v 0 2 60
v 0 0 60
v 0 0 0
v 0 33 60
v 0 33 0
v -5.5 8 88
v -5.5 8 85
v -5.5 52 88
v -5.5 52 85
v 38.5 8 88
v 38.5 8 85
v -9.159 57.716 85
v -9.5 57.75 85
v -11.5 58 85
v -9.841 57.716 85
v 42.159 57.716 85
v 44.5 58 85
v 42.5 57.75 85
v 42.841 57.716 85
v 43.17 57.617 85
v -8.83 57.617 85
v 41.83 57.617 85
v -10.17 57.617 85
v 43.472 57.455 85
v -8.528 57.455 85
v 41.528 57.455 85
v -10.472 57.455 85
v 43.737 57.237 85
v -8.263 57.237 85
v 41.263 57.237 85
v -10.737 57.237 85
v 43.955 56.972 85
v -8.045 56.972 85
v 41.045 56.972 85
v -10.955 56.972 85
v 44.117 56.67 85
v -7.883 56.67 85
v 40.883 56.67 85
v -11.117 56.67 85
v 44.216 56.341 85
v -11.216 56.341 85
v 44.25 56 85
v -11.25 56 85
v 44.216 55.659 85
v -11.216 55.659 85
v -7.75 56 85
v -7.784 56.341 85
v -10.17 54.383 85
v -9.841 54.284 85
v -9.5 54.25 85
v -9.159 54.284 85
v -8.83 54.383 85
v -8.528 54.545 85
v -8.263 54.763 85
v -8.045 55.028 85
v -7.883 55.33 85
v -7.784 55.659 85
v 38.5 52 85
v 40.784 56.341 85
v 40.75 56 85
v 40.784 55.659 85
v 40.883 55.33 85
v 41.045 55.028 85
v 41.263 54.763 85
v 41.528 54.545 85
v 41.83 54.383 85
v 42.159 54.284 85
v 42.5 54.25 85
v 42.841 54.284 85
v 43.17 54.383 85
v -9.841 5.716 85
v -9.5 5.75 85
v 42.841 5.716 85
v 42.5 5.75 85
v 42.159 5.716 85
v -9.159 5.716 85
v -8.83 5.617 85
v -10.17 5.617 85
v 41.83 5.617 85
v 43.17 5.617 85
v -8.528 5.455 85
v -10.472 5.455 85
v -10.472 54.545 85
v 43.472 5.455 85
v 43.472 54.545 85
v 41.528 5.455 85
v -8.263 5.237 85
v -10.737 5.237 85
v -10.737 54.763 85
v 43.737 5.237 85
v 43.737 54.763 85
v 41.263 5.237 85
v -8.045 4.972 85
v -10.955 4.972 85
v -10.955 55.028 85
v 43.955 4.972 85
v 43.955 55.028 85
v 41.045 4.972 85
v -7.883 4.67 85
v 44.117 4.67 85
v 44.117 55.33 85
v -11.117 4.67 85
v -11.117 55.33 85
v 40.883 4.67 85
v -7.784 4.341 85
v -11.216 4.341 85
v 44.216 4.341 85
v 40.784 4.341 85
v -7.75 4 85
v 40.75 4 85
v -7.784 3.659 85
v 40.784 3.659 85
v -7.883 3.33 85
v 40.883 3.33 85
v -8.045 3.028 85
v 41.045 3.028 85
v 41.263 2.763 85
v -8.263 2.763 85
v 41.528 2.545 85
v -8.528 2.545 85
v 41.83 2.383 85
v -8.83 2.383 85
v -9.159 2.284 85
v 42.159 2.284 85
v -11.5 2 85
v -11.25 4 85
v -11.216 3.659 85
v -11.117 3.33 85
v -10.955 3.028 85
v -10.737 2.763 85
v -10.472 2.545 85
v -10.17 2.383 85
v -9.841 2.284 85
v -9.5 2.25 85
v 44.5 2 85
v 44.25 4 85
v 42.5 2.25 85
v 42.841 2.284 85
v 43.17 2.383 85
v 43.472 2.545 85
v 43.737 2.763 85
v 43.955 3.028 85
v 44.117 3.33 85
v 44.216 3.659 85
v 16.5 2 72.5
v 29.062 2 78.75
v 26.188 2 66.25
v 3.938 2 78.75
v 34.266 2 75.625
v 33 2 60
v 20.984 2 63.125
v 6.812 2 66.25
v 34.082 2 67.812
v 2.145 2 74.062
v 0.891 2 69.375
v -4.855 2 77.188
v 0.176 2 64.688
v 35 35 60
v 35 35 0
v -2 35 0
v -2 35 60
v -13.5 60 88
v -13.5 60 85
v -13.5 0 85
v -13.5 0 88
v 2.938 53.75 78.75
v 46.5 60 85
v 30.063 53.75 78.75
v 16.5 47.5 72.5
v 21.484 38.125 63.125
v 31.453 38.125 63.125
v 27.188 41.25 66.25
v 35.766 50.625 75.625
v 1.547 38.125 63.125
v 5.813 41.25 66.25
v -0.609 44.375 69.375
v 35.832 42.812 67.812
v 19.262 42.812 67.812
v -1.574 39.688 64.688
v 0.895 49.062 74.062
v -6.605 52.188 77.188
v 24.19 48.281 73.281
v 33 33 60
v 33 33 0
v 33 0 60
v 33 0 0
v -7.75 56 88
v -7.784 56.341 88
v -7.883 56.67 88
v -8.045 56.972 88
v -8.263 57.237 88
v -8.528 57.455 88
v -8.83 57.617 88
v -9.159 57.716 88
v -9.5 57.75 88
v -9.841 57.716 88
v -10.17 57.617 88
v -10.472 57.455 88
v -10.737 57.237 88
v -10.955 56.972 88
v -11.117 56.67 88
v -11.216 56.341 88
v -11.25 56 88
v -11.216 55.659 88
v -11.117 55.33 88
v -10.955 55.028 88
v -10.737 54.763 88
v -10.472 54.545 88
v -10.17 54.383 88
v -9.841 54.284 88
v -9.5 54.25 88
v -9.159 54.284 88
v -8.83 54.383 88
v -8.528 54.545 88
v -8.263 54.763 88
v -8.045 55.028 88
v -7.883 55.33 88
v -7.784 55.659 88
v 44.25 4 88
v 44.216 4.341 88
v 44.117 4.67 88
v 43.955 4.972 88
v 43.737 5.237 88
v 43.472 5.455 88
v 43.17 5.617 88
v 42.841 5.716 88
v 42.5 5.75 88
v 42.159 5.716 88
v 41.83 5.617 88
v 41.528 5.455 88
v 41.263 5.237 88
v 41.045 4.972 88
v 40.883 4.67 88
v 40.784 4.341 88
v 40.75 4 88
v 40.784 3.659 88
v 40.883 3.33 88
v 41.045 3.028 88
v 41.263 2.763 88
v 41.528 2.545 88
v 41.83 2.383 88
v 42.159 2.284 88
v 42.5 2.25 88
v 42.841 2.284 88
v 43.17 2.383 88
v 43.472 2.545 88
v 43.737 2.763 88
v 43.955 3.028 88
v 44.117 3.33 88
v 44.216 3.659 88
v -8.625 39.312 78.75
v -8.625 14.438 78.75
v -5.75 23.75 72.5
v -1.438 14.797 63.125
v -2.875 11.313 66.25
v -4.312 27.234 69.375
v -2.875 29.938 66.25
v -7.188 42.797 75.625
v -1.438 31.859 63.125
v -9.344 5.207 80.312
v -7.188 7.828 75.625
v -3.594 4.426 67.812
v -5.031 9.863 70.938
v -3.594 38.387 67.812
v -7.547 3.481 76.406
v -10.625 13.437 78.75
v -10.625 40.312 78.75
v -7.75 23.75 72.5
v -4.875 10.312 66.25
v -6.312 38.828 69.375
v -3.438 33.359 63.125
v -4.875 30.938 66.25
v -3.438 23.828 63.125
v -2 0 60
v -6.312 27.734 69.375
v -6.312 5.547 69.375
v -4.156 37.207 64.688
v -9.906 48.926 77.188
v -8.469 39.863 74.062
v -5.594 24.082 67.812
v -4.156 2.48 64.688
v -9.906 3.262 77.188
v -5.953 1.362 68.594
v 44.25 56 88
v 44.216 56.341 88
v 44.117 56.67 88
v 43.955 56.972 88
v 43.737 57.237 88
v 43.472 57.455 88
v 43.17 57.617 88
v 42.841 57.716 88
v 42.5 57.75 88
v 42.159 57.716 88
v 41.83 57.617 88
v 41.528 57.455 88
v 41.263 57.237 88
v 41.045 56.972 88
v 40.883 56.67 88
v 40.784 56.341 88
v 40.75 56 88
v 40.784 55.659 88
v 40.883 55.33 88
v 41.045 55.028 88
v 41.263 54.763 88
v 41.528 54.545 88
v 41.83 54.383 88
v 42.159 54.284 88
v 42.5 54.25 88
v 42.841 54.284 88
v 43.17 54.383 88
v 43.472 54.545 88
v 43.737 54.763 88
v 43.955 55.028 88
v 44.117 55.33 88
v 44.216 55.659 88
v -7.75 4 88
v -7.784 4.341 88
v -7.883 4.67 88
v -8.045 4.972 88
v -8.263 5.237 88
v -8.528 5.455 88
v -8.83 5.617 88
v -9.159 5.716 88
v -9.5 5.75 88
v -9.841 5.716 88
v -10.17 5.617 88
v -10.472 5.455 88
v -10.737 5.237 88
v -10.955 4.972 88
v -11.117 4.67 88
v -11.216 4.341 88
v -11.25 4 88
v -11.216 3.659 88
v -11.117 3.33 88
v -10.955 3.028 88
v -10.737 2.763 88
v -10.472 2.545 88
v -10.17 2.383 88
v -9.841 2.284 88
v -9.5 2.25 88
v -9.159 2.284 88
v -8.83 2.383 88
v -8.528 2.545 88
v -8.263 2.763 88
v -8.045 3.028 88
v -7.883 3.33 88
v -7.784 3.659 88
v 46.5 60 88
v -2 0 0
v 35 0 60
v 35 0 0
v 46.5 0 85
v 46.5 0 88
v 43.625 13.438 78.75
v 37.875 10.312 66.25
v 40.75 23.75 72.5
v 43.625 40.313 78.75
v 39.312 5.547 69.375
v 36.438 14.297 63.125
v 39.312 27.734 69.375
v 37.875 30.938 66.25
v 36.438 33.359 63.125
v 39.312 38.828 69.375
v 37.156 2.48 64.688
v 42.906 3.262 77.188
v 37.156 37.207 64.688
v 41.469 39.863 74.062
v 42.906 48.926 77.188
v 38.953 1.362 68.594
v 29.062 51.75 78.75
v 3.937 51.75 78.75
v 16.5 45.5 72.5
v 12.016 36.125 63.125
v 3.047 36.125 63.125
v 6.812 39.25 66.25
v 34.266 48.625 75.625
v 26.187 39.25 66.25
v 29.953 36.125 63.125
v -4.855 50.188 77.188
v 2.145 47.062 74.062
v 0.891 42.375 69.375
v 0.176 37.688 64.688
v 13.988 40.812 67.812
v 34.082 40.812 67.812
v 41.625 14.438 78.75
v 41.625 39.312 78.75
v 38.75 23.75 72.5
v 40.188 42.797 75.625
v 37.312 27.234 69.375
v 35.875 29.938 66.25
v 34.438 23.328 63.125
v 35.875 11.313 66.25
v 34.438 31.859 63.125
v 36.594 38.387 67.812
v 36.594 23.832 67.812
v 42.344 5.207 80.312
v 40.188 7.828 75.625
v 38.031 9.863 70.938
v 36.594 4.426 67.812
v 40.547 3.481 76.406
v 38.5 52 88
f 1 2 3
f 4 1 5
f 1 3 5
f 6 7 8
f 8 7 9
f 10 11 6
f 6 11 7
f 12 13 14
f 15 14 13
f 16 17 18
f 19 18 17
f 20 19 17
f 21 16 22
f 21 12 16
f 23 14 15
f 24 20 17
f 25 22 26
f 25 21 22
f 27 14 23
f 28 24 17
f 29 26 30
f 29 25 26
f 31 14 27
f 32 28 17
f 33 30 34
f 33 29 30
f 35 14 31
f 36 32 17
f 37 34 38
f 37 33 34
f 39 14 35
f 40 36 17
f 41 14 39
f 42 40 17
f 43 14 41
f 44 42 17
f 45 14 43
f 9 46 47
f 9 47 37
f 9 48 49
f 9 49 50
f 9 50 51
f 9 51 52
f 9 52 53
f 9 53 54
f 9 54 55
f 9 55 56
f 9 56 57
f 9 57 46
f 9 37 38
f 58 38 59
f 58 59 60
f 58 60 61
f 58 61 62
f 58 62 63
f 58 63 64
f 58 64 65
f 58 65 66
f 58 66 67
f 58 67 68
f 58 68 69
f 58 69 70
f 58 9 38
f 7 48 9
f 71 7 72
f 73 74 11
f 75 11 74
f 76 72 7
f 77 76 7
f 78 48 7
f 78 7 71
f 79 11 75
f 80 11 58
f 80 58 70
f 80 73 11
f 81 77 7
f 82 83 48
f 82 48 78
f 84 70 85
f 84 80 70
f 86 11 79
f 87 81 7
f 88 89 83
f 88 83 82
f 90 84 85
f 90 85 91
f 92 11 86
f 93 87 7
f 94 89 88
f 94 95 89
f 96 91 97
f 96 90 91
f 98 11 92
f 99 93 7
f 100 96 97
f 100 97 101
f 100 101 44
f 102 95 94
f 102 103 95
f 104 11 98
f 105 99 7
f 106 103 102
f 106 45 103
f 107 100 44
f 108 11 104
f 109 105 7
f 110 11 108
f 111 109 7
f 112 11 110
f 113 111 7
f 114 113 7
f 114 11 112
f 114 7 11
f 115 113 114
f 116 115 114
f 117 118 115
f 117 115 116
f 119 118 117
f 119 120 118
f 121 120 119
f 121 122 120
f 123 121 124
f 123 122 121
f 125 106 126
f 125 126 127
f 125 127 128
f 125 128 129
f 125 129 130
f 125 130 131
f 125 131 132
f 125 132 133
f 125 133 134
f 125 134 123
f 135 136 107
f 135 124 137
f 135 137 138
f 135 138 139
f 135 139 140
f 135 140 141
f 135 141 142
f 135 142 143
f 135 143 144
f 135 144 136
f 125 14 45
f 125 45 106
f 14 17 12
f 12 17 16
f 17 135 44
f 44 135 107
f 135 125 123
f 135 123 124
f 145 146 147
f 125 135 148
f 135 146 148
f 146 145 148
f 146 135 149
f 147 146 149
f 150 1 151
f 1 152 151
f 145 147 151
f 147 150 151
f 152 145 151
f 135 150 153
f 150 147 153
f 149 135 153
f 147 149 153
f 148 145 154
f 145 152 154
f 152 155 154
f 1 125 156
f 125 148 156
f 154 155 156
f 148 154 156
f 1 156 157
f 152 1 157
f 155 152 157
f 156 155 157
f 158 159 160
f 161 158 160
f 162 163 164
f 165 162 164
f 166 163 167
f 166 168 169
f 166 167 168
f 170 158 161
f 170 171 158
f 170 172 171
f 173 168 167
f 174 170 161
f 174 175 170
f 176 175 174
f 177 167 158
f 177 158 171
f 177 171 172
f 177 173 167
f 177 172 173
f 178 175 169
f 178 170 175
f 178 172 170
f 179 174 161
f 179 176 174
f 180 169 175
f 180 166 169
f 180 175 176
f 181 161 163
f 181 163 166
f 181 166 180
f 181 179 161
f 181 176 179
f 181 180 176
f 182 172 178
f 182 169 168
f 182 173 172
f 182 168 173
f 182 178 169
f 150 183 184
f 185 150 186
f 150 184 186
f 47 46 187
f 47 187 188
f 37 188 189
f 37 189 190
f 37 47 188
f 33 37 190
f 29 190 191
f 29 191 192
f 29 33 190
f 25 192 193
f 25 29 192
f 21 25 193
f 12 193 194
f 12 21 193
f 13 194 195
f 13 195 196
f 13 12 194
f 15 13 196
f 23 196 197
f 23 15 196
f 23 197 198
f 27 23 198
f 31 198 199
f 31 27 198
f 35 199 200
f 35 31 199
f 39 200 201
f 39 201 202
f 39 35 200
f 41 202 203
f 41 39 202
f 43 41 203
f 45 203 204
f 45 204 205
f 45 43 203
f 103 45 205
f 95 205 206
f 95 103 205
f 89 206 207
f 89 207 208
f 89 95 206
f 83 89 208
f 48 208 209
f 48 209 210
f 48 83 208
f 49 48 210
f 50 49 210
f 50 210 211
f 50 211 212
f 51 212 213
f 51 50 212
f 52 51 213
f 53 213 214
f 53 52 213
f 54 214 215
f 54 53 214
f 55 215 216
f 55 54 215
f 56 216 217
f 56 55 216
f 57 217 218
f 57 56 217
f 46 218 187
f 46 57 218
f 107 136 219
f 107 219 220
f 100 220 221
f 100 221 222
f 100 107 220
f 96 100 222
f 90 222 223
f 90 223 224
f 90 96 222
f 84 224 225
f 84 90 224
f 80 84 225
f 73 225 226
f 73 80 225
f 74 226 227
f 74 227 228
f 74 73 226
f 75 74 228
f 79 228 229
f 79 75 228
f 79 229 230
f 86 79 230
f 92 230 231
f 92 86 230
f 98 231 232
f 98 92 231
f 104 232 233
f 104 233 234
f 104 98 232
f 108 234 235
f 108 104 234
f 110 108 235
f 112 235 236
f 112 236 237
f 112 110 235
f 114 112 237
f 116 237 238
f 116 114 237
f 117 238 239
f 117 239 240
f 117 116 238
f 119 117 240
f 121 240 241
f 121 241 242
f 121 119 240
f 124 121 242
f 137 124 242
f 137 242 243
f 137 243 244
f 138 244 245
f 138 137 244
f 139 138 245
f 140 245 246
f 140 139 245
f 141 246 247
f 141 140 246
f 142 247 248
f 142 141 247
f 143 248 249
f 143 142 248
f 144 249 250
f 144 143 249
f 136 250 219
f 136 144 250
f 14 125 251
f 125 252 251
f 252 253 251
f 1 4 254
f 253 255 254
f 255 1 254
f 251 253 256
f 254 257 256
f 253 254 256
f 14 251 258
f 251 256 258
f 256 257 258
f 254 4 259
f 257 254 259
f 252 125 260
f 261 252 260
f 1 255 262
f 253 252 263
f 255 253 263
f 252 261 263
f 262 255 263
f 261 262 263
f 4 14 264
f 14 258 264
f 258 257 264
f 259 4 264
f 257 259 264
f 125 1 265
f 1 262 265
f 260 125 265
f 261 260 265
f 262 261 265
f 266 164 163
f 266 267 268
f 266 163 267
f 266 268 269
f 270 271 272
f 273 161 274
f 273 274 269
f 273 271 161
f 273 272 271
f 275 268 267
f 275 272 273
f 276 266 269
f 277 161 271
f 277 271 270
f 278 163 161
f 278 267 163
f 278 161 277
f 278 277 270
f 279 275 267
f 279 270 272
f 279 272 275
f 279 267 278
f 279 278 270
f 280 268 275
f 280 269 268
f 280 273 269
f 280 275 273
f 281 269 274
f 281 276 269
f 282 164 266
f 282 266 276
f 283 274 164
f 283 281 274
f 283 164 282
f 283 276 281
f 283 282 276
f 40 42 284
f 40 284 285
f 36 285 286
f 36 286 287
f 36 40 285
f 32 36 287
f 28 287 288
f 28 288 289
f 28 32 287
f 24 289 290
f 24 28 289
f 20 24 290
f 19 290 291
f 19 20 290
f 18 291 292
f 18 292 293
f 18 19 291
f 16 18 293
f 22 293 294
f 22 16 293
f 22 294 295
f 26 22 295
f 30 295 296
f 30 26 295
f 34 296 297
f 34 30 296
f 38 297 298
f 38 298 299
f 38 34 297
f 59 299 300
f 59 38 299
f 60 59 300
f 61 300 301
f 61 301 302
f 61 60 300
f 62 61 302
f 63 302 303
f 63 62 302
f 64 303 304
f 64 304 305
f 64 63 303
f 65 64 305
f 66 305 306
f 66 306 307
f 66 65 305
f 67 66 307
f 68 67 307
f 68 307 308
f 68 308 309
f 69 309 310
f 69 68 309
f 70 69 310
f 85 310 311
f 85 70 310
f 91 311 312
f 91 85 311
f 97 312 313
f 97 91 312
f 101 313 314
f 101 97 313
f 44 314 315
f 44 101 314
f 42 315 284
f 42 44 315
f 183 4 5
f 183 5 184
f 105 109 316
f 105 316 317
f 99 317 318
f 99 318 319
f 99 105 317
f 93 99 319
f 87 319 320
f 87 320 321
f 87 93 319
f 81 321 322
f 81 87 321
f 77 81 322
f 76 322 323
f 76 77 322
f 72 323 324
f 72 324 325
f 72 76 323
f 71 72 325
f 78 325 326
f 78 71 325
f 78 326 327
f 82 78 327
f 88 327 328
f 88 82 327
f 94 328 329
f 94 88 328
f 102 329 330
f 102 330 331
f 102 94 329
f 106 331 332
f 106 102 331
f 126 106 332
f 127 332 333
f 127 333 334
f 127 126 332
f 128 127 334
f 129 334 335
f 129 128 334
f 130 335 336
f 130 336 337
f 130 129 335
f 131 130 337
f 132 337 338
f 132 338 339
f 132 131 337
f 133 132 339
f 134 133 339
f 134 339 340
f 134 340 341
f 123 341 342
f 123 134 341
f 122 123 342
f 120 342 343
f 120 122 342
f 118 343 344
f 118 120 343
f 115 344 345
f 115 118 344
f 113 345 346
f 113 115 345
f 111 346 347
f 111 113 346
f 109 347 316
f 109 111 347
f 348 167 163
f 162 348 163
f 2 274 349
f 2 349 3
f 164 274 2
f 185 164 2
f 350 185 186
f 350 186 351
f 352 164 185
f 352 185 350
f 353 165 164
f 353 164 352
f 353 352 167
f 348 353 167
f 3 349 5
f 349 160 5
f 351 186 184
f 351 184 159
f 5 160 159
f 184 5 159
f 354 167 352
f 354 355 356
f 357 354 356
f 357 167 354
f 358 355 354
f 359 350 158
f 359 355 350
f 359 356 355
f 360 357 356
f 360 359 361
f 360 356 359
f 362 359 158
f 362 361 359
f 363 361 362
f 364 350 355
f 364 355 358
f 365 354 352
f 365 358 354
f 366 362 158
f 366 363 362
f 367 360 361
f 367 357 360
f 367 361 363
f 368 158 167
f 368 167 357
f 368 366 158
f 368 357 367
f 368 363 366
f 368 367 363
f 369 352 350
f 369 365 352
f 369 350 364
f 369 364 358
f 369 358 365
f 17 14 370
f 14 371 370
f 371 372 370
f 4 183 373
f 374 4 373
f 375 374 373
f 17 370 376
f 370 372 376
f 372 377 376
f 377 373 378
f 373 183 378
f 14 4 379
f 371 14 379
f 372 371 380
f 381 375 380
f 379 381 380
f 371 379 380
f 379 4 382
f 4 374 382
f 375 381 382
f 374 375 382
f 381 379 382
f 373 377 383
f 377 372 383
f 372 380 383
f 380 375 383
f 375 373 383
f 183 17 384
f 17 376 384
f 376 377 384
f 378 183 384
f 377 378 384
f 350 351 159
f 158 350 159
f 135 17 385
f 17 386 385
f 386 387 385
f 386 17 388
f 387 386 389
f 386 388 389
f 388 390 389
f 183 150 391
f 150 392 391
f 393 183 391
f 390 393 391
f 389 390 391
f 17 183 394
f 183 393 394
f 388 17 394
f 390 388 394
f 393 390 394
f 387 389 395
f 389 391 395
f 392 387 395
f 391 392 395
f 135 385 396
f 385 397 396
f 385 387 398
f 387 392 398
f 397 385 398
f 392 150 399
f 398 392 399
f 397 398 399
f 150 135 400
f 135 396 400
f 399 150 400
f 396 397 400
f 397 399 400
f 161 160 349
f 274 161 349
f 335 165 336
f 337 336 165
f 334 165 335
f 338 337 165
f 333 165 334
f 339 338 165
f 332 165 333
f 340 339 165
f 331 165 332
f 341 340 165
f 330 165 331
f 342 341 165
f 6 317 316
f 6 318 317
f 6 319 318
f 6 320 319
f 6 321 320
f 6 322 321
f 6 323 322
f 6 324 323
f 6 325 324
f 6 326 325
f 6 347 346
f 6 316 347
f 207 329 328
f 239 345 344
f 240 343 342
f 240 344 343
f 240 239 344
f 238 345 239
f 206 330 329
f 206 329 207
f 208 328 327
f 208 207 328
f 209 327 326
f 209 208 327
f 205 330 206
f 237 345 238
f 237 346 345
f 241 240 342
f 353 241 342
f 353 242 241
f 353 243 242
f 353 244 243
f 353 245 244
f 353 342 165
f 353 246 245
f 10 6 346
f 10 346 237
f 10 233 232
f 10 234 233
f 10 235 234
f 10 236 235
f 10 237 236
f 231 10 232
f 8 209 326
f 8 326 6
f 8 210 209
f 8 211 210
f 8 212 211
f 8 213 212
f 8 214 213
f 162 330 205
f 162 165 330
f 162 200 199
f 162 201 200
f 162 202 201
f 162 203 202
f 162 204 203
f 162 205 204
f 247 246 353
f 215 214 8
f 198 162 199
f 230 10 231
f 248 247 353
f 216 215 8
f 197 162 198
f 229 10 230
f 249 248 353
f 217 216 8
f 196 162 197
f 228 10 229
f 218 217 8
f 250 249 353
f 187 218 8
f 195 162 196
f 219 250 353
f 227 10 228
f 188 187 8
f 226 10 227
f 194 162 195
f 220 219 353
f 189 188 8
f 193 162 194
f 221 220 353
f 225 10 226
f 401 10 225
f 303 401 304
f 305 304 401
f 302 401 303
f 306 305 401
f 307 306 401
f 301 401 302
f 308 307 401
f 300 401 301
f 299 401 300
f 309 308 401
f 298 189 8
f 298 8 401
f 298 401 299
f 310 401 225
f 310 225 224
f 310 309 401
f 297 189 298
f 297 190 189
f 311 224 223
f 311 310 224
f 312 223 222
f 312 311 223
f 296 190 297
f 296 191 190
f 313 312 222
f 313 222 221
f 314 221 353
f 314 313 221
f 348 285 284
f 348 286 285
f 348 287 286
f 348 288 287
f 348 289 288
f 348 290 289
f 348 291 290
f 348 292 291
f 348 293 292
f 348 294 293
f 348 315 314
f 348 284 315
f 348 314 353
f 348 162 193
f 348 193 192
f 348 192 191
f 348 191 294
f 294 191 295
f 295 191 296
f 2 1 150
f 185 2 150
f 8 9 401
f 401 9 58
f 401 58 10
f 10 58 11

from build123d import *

# Parameters (mm, degrees)
F1_DEPTH = 60
F3_R     = 1.75
F3_W     = 3.5
F3_H     = 8
F3_W_2   = 2
F3_W_3   = 33
F4_DEPTH = 3
F6_W     = 37
F6_H     = 35
F5_W     = 60
F5_H     = 60
F10_W    = 56
F10_H    = 56


# Not quite as in the source:
# - a feature names something its author has since deleted; it is built from what else it names


with BuildPart() as f1:
    # F0 (on Top) → F1 (new body)
    with BuildSketch(Plane.XY):
        Polygon((-2, 0), (0, 0), (0, 33), (33, 33), (33, 0), (35, 0), (35, 35), (-2, 35), align=None)
    extrude(amount=F1_DEPTH)



with BuildPart() as f4:
    # F3 (on offset) → F4 (new body)
    with BuildSketch(Plane.XY.offset(85)):
        Polygon((-13.5, 0), (-5.5, 0), (-5.5, 8), (-5.5, 52), (38.5, 52), (38.5, 8), (38.5, 0), (46.5, 0), (46.5, 60), (-13.5, 60), align=None)
        with Locations((-9.5, 4)):
            Circle(F3_R, mode=Mode.SUBTRACT)
        with Locations((42.5, 4)):
            Circle(F3_R, mode=Mode.SUBTRACT)
        with Locations((-9.5, 56)):
            Circle(F3_R, mode=Mode.SUBTRACT)
        with Locations((42.5, 56)):
            Circle(F3_R, mode=Mode.SUBTRACT)
        with Locations((-3.75, 4)):
            Rectangle(F3_W, F3_H)
        with Locations((36.75, 4)):
            Rectangle(F3_W, F3_H)
        with Locations((34, 4)):
            Rectangle(F3_W_2, F3_H)
        with Locations((-1, 4)):
            Rectangle(F3_W_2, F3_H)
        with Locations((16.5, 4)):
            Rectangle(F3_W_3, F3_H)
    extrude(amount=F4_DEPTH)


with BuildPart() as f1_1:
    add(f1.part)

    add(f4.part)  # F7 merges F4
    # F6 (on face) → F7 section 0
    with BuildSketch(Plane.XY.offset(60)):
        with Locations((16.5, 17.5)):
            Rectangle(F6_W, F6_H)
    # F5 (on face) → F7 section 1
    with BuildSketch(Plane.XY.offset(85)):
        with Locations((16.5, 30)):
            Rectangle(F5_W, F5_H)
    loft()


with BuildPart() as f11:
    # F10 (on offset) → F11 section 0
    with BuildSketch(Plane(origin=(0, 0, 85), x_dir=(1, 0, 0), z_dir=(0, 0, -1))):
        with Locations((16.5, -30)):
            Rectangle(F10_W, F10_H)
    # F9 (on face) → F11 section 1
    with BuildSketch(Plane.XY.offset(60)):
        Polygon((0, 33), (0, 2), (2, 2), (4, 2), (29, 2), (31, 2), (33, 2), (33, 33), align=None)
    loft()


with BuildPart() as f1_2:
    add(f1_1.part)

    # F13: cut F11
    add(f11.part, mode=Mode.SUBTRACT)


solid = f1_2.part
